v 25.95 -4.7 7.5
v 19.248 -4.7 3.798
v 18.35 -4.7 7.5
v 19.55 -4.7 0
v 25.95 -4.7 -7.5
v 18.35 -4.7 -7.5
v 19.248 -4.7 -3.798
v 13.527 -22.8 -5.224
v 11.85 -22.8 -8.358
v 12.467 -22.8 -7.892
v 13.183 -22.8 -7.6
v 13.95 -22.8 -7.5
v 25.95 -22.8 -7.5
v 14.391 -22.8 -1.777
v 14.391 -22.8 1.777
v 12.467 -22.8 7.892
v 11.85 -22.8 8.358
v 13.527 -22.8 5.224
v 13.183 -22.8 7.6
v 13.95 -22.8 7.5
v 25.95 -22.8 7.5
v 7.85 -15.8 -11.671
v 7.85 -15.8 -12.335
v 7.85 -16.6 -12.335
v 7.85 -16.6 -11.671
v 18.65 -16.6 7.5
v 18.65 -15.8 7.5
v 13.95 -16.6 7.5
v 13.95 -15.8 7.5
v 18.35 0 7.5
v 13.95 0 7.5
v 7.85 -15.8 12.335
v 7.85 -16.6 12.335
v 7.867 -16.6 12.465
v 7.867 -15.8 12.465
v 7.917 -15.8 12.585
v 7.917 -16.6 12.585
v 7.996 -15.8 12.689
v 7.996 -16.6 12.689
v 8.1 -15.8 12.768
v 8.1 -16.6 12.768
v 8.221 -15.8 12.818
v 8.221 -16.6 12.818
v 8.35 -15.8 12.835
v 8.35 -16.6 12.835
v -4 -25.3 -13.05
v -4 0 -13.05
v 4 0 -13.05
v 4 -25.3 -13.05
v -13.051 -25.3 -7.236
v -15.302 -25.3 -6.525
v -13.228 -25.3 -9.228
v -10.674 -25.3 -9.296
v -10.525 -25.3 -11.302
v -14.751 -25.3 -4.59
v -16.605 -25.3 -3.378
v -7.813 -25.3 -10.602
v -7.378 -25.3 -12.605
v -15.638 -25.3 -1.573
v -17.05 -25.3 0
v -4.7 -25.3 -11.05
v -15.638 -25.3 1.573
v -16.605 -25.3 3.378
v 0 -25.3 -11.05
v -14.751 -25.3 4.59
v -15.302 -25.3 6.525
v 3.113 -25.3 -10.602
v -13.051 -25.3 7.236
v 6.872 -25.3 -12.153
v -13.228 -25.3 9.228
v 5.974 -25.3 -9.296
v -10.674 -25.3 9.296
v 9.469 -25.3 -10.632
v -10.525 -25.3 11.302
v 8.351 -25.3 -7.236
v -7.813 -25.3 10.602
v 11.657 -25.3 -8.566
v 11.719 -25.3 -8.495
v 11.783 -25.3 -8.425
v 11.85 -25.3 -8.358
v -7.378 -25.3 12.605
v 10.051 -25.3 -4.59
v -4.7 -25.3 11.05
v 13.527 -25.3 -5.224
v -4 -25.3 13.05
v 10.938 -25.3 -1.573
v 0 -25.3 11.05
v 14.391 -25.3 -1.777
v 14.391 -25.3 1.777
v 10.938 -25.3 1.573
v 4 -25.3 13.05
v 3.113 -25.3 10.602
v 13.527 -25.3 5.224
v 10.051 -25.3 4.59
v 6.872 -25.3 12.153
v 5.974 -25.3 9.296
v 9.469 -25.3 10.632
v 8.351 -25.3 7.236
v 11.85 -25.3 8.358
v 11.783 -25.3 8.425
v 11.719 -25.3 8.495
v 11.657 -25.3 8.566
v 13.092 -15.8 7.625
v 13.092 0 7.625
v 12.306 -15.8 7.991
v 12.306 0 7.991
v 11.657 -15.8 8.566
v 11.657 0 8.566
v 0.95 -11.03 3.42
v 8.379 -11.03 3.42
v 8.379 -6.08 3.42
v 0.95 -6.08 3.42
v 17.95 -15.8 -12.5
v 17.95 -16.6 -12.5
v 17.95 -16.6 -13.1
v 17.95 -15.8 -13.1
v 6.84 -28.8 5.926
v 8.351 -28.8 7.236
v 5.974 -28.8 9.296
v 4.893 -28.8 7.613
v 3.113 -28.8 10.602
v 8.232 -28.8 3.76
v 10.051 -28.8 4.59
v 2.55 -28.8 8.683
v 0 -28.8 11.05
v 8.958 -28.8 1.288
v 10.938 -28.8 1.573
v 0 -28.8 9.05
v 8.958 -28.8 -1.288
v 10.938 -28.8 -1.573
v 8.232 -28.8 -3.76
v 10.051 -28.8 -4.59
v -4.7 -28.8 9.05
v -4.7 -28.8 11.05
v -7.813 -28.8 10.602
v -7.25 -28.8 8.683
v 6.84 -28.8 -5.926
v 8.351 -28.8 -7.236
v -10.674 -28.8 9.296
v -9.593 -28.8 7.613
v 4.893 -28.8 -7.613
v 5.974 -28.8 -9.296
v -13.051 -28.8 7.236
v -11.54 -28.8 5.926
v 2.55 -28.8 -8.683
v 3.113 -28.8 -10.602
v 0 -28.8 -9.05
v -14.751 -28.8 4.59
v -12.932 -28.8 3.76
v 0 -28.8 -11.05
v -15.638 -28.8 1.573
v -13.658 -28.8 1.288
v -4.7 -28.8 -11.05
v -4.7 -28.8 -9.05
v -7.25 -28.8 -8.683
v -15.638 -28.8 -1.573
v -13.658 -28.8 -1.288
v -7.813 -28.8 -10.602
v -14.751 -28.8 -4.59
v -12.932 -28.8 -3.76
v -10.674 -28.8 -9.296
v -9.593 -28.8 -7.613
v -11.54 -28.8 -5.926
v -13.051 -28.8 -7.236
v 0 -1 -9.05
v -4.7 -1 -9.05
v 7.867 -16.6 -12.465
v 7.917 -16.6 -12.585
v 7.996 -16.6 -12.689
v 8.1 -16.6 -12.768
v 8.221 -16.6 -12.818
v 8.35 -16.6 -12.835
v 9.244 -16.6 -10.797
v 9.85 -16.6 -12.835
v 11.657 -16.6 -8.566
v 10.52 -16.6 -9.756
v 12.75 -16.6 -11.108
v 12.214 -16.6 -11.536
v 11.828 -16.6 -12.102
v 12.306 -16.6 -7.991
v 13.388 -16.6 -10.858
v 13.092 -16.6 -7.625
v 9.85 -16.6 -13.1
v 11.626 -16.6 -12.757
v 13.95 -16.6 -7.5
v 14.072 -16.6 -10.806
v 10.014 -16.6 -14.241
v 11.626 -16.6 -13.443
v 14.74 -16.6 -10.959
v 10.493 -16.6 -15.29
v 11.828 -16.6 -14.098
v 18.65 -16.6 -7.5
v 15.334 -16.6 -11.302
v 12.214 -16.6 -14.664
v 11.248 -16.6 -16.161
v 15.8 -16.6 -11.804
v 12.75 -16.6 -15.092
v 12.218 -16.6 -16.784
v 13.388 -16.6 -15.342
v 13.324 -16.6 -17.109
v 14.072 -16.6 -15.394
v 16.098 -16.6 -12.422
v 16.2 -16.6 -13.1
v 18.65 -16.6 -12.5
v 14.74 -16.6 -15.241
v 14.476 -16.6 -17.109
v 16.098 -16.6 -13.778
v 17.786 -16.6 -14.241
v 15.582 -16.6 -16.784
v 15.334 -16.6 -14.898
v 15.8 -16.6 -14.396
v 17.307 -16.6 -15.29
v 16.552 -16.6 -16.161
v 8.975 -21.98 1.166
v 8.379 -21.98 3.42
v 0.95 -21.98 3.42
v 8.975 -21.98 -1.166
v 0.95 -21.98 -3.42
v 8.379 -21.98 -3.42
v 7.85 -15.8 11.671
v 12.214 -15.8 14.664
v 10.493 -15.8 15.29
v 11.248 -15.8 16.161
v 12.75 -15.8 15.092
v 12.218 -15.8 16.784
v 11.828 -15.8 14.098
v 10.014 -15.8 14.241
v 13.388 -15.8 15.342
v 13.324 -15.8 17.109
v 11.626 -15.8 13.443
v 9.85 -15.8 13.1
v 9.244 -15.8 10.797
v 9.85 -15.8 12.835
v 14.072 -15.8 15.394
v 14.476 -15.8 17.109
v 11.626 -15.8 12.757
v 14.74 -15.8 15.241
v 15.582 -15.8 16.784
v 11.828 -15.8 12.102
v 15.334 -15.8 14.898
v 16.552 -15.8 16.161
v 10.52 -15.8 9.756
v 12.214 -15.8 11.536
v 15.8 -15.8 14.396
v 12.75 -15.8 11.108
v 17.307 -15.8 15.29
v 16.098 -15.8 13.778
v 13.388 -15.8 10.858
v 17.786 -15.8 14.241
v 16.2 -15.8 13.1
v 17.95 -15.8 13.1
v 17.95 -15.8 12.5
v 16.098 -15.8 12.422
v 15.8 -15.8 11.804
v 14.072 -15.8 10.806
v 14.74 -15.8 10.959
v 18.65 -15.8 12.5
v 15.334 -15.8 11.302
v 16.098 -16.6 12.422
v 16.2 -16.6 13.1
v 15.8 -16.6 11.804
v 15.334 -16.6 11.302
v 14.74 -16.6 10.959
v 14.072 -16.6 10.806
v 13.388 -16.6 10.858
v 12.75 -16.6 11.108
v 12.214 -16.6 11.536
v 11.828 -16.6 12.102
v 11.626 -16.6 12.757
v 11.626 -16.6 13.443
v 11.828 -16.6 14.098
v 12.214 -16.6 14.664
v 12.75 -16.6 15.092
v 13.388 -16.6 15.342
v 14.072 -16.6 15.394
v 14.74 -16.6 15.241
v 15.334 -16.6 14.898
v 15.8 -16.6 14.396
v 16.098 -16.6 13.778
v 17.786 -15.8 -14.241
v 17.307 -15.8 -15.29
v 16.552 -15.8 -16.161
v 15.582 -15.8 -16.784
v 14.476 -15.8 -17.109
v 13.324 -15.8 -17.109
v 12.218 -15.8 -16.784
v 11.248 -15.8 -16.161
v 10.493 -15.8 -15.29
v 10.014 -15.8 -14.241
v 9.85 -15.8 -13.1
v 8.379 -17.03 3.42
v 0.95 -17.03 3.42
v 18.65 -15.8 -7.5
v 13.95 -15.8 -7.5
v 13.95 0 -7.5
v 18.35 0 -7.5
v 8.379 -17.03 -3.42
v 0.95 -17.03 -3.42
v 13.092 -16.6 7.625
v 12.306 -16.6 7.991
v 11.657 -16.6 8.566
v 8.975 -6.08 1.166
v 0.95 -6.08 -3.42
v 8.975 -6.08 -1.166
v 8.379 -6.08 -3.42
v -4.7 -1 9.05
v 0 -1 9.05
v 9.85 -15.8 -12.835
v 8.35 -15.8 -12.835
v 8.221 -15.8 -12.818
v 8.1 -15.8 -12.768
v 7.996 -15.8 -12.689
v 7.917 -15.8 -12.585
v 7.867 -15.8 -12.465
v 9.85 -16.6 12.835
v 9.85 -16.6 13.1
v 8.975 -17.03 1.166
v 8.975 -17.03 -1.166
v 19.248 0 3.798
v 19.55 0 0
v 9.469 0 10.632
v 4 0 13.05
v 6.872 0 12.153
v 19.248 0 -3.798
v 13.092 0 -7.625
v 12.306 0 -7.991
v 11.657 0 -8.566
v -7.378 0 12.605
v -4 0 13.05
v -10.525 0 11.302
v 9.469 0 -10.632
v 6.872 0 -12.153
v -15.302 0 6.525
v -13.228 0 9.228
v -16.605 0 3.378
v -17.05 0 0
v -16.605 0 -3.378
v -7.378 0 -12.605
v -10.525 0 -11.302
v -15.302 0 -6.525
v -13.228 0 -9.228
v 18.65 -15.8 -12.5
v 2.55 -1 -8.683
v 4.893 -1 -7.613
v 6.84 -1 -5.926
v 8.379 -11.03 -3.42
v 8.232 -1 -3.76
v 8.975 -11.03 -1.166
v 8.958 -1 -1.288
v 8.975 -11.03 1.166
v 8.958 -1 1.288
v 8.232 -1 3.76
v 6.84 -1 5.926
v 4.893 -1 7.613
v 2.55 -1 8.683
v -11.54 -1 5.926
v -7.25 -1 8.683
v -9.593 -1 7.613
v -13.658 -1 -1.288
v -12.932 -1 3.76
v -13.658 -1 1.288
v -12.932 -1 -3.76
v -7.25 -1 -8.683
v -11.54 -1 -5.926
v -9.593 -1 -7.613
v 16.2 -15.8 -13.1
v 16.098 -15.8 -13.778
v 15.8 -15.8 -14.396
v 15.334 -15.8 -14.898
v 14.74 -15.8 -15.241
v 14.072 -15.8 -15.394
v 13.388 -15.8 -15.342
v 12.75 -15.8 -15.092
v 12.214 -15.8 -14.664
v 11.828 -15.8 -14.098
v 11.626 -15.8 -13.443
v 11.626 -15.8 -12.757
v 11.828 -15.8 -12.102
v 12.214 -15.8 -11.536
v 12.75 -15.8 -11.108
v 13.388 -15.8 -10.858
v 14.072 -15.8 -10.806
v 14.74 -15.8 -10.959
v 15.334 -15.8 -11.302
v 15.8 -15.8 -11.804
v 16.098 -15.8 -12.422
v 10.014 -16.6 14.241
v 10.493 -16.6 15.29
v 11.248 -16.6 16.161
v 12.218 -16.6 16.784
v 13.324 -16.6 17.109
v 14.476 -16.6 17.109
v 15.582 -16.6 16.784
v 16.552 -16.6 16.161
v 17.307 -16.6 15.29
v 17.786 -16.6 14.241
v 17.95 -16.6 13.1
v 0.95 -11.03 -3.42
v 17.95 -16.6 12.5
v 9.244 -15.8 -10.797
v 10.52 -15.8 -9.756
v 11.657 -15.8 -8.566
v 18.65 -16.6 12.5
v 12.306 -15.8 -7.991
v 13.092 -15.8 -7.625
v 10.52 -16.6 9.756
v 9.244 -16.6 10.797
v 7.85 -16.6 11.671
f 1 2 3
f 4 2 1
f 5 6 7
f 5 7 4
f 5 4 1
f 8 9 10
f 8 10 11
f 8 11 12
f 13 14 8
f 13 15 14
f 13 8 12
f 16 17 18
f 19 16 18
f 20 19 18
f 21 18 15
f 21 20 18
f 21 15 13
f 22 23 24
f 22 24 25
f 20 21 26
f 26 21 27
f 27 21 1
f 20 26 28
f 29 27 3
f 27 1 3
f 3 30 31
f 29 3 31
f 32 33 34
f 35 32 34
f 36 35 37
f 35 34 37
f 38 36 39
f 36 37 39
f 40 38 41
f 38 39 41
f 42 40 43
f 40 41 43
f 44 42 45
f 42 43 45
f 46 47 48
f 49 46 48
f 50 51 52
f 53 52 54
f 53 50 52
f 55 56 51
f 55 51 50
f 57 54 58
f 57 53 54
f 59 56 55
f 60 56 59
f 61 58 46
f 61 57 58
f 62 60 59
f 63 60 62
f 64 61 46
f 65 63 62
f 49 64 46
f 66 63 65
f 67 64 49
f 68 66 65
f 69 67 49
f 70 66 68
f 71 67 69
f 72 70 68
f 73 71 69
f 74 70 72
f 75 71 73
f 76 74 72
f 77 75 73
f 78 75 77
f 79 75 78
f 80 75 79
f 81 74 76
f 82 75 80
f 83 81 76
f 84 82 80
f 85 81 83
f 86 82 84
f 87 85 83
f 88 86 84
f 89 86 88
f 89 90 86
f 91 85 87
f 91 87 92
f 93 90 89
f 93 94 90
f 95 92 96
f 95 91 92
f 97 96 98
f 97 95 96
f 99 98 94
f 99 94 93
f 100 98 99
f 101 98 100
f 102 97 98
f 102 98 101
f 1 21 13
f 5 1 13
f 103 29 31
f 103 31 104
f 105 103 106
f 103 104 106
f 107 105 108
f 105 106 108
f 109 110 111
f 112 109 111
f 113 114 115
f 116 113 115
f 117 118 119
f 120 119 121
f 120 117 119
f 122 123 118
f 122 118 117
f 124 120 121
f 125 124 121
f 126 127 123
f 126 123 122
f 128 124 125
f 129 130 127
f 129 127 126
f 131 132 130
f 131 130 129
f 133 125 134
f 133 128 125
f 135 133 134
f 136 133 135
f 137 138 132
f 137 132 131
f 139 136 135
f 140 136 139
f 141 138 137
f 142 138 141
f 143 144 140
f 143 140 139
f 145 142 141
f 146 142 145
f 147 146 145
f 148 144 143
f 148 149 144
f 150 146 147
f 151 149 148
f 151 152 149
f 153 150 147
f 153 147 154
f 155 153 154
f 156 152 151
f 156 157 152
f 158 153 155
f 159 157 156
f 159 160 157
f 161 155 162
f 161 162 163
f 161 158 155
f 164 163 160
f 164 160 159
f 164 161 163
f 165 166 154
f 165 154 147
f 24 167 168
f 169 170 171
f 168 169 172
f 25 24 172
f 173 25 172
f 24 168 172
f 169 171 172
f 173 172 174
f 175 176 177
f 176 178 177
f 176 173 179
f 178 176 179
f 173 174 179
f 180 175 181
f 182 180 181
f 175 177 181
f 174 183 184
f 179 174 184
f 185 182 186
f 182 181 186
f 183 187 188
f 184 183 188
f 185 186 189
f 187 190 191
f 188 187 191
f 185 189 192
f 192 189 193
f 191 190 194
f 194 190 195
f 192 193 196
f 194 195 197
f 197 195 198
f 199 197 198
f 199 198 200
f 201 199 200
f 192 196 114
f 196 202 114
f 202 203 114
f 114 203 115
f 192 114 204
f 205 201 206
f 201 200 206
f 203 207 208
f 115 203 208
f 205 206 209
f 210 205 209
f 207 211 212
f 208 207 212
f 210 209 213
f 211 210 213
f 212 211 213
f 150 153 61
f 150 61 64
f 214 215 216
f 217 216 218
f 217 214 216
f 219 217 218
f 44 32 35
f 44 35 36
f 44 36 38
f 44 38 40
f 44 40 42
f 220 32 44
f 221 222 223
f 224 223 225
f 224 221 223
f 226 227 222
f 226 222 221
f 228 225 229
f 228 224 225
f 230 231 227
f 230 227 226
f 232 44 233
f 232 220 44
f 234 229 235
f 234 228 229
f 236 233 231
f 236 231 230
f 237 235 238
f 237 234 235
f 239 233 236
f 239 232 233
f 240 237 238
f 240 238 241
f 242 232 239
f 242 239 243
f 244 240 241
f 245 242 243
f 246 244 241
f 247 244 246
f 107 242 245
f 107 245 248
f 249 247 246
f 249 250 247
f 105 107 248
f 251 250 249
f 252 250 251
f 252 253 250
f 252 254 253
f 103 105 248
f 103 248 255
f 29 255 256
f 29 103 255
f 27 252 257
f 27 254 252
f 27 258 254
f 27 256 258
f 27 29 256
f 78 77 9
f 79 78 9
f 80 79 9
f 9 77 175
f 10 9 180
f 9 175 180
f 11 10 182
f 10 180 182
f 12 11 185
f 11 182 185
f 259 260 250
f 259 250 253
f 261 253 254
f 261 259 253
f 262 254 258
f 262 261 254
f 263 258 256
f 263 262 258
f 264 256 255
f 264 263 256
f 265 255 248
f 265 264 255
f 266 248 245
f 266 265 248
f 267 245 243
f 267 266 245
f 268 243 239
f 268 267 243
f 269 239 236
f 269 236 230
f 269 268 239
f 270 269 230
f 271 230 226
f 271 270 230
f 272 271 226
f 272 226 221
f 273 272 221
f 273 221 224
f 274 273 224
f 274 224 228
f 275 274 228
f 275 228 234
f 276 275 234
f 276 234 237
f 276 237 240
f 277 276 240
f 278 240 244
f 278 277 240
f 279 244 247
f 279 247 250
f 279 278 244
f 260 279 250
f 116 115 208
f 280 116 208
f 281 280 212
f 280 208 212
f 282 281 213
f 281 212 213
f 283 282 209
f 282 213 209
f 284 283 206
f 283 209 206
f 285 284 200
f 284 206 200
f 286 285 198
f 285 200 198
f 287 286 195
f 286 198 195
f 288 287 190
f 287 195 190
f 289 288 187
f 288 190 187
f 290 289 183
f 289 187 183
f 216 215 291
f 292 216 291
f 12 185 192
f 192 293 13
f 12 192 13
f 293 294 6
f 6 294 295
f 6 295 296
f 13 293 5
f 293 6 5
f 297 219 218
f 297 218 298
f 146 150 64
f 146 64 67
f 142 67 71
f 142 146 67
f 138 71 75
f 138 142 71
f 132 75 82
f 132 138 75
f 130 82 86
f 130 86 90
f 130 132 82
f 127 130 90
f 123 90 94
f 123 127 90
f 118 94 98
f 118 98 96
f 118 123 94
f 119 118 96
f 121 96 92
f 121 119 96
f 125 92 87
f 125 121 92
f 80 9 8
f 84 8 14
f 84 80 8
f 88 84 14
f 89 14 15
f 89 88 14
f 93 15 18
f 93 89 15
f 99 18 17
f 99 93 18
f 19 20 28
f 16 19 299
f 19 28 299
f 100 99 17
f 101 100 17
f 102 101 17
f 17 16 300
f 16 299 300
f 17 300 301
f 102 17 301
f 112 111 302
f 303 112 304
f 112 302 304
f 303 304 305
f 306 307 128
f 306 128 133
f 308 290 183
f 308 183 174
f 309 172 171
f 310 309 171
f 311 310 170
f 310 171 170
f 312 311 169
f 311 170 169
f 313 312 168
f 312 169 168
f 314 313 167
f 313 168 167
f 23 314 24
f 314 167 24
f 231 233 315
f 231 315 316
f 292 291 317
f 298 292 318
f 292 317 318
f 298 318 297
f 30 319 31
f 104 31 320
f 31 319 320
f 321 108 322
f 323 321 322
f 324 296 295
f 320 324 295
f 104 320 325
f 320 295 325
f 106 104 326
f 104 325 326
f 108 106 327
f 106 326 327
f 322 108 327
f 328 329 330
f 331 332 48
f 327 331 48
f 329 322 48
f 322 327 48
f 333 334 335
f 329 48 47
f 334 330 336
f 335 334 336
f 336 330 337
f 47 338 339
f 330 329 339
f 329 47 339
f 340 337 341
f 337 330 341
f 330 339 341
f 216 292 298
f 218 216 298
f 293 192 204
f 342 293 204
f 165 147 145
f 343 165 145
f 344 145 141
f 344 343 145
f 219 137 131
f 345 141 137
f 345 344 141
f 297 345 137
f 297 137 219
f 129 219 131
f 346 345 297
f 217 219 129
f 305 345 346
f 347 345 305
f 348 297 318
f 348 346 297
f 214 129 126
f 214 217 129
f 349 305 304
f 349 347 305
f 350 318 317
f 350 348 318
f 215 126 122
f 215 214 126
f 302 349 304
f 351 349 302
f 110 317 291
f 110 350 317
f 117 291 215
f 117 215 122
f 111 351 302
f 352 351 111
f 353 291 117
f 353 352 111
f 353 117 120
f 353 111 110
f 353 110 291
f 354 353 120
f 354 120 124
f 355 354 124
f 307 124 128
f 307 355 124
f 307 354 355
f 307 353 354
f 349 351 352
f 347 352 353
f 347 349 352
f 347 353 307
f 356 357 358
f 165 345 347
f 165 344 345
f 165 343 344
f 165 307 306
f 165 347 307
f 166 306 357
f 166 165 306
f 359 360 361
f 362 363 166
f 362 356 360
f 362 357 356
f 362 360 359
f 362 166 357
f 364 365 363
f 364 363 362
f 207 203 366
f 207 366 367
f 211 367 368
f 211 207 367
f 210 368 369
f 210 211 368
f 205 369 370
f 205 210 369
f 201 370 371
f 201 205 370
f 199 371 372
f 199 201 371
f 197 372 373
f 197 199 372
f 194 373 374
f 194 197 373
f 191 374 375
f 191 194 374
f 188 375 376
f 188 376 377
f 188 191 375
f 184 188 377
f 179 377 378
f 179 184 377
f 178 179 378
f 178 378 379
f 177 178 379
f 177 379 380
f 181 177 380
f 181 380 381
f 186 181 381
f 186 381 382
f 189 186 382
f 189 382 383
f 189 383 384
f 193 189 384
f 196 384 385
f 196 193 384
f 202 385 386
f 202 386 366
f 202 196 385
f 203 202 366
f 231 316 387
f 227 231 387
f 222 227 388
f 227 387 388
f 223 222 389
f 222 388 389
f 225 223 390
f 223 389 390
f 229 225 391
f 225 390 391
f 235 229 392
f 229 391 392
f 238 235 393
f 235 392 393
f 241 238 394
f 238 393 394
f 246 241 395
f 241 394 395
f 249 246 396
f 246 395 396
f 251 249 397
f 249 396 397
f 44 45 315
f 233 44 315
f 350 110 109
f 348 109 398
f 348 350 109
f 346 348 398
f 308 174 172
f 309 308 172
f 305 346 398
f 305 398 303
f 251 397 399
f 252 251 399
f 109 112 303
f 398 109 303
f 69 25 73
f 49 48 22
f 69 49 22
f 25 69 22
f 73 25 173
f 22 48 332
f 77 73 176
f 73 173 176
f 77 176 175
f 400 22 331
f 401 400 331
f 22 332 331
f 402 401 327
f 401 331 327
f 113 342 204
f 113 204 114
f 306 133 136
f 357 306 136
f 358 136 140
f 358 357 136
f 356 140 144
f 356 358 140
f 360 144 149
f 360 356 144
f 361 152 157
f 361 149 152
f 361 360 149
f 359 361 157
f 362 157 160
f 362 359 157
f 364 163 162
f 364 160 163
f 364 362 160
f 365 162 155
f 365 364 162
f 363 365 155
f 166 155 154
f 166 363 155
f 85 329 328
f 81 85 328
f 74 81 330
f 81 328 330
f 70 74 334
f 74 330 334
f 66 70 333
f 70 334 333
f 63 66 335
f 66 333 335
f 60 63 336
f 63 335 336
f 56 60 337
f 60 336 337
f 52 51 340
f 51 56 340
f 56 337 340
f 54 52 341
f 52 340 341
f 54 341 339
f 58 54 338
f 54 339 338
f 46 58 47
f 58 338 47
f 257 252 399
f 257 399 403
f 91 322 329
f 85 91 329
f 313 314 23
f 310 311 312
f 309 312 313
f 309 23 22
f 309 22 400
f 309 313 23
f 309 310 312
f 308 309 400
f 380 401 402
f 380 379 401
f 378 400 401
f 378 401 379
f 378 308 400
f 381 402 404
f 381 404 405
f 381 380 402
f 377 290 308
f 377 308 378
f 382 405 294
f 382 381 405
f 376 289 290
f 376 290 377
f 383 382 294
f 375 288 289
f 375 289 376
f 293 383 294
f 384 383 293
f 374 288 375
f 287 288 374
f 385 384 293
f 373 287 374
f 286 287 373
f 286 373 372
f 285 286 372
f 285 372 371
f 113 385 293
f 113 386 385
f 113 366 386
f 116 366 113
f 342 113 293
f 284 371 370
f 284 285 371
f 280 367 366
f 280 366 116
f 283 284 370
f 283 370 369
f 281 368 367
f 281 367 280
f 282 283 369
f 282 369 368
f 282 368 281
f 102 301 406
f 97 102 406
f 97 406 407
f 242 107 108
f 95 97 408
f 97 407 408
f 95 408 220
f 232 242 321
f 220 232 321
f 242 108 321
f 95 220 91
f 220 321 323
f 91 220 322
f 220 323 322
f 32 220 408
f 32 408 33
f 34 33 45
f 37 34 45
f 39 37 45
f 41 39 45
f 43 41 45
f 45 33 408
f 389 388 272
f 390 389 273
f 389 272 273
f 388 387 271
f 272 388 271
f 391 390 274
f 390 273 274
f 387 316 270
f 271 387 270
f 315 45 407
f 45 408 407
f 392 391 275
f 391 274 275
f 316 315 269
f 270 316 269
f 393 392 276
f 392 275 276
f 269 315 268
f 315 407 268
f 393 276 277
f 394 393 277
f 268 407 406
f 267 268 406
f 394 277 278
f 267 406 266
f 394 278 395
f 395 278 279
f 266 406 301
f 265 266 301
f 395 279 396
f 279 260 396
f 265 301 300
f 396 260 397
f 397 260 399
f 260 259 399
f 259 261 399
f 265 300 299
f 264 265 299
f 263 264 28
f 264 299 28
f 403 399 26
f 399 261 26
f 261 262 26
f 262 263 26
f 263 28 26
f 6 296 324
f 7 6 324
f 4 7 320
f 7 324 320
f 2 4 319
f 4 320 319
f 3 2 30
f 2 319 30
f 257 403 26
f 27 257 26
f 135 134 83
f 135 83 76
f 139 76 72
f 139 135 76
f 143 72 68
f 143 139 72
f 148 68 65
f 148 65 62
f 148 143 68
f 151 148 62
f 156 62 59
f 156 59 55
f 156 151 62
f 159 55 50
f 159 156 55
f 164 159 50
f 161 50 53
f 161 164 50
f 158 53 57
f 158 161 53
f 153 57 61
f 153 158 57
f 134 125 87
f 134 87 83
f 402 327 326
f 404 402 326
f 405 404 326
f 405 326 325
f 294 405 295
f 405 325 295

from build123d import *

# Parameters (mm, degrees)
BOSS_EXTRUDE1_DEPTH = 28.8
CUT_EXTRUDE1_DEPTH  = 41.90409515
BOSS_EXTRUDE3_DEPTH = 1
CUT_EXTRUDE2_DEPTH  = 4.7
SKETCH4_R           = 2.3
BOSS_EXTRUDE2_DEPTH = 0.8
SKETCH5_OUTSIDE_W   = 57.418
SKETCH5_OUTSIDE_H   = 48.718
CUT_EXTRUDE3_DEPTH  = 3.5
SKETCH6_OUTSIDE_W   = 57.418
SKETCH6_OUTSIDE_H   = 48.718
CUT_EXTRUDE4_DEPTH  = 2.5
SKETCH8_W           = 6.84
SKETCH8_H           = 4.95
BOSS_EXTRUDE4_DEPTH = 25


with BuildPart() as part:
    # Sketch1 → Boss-Extrude1 (new body)
    with BuildSketch(Plane(origin=(0, 0, 0), x_dir=(1, 0, 0), z_dir=(0, 1, 0))):
        with BuildLine():
            Line((-4, 13.05), (4, 13.05))
            ThreePointArc((4, 13.05), (8.213640499, 11.465985784), (11.656602829, 8.566006872))
            ThreePointArc((11.656602829, 8.566006872), (12.685480206, 7.779523995), (13.95, 7.5))
            Line((13.95, 7.5), (25.95, 7.5))
            Line((25.95, 7.5), (25.95, -7.5))
            Line((25.95, -7.5), (13.95, -7.5))
            ThreePointArc((13.95, -7.5), (12.685480206, -7.779523995), (11.656602829, -8.566006872))
            ThreePointArc((11.656602829, -8.566006872), (8.213640499, -11.465985784), (4, -13.05))
            Line((4, -13.05), (-4, -13.05))
            ThreePointArc((-4, -13.05), (-17.05, 0), (-4, 13.05))
        make_face()
    extrude(amount=-BOSS_EXTRUDE1_DEPTH)

    # Sketch2 → Cut-Extrude1 (cut, through all)
    with BuildSketch(Plane(origin=(0, 0, 0), x_dir=(1, 0, 0), z_dir=(0, 1, 0))):
        with BuildLine():
            Line((0, -9.05), (-4.7, -9.05))
            ThreePointArc((-4.7, -9.05), (-13.75, 0), (-4.7, 9.05))
            Line((-4.7, 9.05), (0, 9.05))
            ThreePointArc((0, 9.05), (9.05, 0), (0, -9.05))
        make_face()
    extrude(amount=-CUT_EXTRUDE1_DEPTH, mode=Mode.SUBTRACT)

    # Sketch7 → Boss-Extrude3 (add)
    with BuildSketch(Plane(origin=(0, 0, 0), x_dir=(1, 0, 0), z_dir=(0, 1, 0))):
        with BuildLine():
            Line((-4.7, 10.05), (0, 10.05))
            ThreePointArc((0, 10.05), (10.05, 0), (0, -10.05))
            Line((0, -10.05), (-4.7, -10.05))
            ThreePointArc((-4.7, -10.05), (-14.75, 0), (-4.7, 10.05))
        make_face()
    extrude(amount=-BOSS_EXTRUDE3_DEPTH)

    # Sketch3 → Cut-Extrude2 (cut)
    with BuildSketch(Plane(origin=(0, 0, 0), x_dir=(1, 0, 0), z_dir=(0, 1, 0))):
        with BuildLine():
            Line((25.95, 7.5), (18.35, 7.5))
            ThreePointArc((18.35, 7.5), (19.55, 0), (18.35, -7.5))
            Line((18.35, -7.5), (25.95, -7.5))
            Line((25.95, -7.5), (25.95, 7.5))
        make_face()
    extrude(amount=-CUT_EXTRUDE2_DEPTH, mode=Mode.SUBTRACT)

    # Sketch4 → Boss-Extrude2 (add)
    with BuildSketch(Plane(origin=(0, -15.8, 0), x_dir=(1, 0, 0), z_dir=(0, 1, 0))):
        with BuildLine():
            Line((17.95, 12.5), (17.95, 13.1))
            ThreePointArc((17.95, 13.1), (13.9, 17.15), (9.85, 13.1))
            Line((9.85, 13.1), (9.85, 12.835141167))
            Line((9.85, 12.835141167), (8.35, 12.835141167))
            ThreePointArc((8.35, 12.835141167), (7.996446609, 12.688694558), (7.85, 12.335141167))
            Line((7.85, 12.335141167), (7.85, 10.106704765))
            Line((7.85, 10.106704765), (9.85, 10.106704765))
            Line((9.85, 10.106704765), (9.85, -10.106704765))
            Line((9.85, -10.106704765), (7.85, -10.106704765))
            Line((7.85, -10.106704765), (7.85, -12.335141167))
            ThreePointArc((7.85, -12.335141167), (7.996446609, -12.688694558), (8.35, -12.835141167))
            Line((8.35, -12.835141167), (9.85, -12.835141167))
            Line((9.85, -12.835141167), (9.85, -13.1))
            ThreePointArc((9.85, -13.1), (13.9, -17.15), (17.95, -13.1))
            Line((17.95, -13.1), (17.95, -12.5))
            Line((17.95, -12.5), (18.65, -12.5))
            Line((18.65, -12.5), (18.65, -6.668963251))
            Line((18.65, -6.668963251), (17.95, -6.668963251))
            Line((17.95, -6.668963251), (17.95, 6.668963251))
            Line((17.95, 6.668963251), (18.65, 6.668963251))
            Line((18.65, 6.668963251), (18.65, 12.5))
            Line((18.65, 12.5), (17.95, 12.5))
        make_face()
        with Locations((13.9, -13.1)):
            Circle(SKETCH4_R, mode=Mode.SUBTRACT)
        with Locations((13.9, 13.1)):
            Circle(SKETCH4_R, mode=Mode.SUBTRACT)
    extrude(amount=-BOSS_EXTRUDE2_DEPTH)

    # Sketch5 outside → Cut-Extrude3 (cut)
    # profile 1 of 2: a face of its own
    with BuildSketch(Plane.XZ.offset(28.8)):
        with Locations((4.45, 0)):
            Rectangle(SKETCH5_OUTSIDE_W, SKETCH5_OUTSIDE_H)
        with BuildLine():
            Line((0, 11.05), (-4.7, 11.05))
            ThreePointArc((-4.7, 11.05), (-15.75, 0), (-4.7, -11.05))
            Line((-4.7, -11.05), (0, -11.05))
            ThreePointArc((0, -11.05), (11.05, 0), (0, 11.05))
        make_face(mode=Mode.SUBTRACT)
    # profile 2 of 2: a face of its own
    with BuildSketch(Plane.XZ.offset(28.8)):
        with BuildLine():
            Line((-4.7, 9.05), (0, 9.05))
            ThreePointArc((0, 9.05), (9.05, 0), (0, -9.05))
            Line((0, -9.05), (-4.7, -9.05))
            ThreePointArc((-4.7, -9.05), (-13.75, 0), (-4.7, 9.05))
        make_face()
    extrude(amount=-CUT_EXTRUDE3_DEPTH, mode=Mode.SUBTRACT)

    # Sketch6 outside → Cut-Extrude4 (cut)
    with BuildSketch(Plane.XZ.offset(25.3)):
        with Locations((4.45, 0)):
            Rectangle(SKETCH6_OUTSIDE_W, SKETCH6_OUTSIDE_H)
        with BuildLine():
            Line((-0.915214063, 14.471830711), (-20.749472671, 14.471830711))
            Line((-20.749472671, 14.471830711), (-20.749472671, -14.500741391))
            Line((-20.749472671, -14.500741391), (0, -14.500741391))
            ThreePointArc((0, -14.500741391), (14.493511919, 0.457835289), (-0.915214063, 14.471830711))
        make_face(mode=Mode.SUBTRACT)
    extrude(amount=-CUT_EXTRUDE4_DEPTH, mode=Mode.SUBTRACT)

    # Sketch8 → Boss-Extrude4 (add)
    with BuildSketch(Plane(origin=(25.95, 0, 0), x_dir=(0, 0, -1), z_dir=(1, 0, 0))):
        with Locations((0, -19.505)):
            Rectangle(SKETCH8_W, SKETCH8_H)
        with Locations((0, -8.555)):
            Rectangle(SKETCH8_W, SKETCH8_H)
    extrude(amount=-BOSS_EXTRUDE4_DEPTH)


solid = part.part
